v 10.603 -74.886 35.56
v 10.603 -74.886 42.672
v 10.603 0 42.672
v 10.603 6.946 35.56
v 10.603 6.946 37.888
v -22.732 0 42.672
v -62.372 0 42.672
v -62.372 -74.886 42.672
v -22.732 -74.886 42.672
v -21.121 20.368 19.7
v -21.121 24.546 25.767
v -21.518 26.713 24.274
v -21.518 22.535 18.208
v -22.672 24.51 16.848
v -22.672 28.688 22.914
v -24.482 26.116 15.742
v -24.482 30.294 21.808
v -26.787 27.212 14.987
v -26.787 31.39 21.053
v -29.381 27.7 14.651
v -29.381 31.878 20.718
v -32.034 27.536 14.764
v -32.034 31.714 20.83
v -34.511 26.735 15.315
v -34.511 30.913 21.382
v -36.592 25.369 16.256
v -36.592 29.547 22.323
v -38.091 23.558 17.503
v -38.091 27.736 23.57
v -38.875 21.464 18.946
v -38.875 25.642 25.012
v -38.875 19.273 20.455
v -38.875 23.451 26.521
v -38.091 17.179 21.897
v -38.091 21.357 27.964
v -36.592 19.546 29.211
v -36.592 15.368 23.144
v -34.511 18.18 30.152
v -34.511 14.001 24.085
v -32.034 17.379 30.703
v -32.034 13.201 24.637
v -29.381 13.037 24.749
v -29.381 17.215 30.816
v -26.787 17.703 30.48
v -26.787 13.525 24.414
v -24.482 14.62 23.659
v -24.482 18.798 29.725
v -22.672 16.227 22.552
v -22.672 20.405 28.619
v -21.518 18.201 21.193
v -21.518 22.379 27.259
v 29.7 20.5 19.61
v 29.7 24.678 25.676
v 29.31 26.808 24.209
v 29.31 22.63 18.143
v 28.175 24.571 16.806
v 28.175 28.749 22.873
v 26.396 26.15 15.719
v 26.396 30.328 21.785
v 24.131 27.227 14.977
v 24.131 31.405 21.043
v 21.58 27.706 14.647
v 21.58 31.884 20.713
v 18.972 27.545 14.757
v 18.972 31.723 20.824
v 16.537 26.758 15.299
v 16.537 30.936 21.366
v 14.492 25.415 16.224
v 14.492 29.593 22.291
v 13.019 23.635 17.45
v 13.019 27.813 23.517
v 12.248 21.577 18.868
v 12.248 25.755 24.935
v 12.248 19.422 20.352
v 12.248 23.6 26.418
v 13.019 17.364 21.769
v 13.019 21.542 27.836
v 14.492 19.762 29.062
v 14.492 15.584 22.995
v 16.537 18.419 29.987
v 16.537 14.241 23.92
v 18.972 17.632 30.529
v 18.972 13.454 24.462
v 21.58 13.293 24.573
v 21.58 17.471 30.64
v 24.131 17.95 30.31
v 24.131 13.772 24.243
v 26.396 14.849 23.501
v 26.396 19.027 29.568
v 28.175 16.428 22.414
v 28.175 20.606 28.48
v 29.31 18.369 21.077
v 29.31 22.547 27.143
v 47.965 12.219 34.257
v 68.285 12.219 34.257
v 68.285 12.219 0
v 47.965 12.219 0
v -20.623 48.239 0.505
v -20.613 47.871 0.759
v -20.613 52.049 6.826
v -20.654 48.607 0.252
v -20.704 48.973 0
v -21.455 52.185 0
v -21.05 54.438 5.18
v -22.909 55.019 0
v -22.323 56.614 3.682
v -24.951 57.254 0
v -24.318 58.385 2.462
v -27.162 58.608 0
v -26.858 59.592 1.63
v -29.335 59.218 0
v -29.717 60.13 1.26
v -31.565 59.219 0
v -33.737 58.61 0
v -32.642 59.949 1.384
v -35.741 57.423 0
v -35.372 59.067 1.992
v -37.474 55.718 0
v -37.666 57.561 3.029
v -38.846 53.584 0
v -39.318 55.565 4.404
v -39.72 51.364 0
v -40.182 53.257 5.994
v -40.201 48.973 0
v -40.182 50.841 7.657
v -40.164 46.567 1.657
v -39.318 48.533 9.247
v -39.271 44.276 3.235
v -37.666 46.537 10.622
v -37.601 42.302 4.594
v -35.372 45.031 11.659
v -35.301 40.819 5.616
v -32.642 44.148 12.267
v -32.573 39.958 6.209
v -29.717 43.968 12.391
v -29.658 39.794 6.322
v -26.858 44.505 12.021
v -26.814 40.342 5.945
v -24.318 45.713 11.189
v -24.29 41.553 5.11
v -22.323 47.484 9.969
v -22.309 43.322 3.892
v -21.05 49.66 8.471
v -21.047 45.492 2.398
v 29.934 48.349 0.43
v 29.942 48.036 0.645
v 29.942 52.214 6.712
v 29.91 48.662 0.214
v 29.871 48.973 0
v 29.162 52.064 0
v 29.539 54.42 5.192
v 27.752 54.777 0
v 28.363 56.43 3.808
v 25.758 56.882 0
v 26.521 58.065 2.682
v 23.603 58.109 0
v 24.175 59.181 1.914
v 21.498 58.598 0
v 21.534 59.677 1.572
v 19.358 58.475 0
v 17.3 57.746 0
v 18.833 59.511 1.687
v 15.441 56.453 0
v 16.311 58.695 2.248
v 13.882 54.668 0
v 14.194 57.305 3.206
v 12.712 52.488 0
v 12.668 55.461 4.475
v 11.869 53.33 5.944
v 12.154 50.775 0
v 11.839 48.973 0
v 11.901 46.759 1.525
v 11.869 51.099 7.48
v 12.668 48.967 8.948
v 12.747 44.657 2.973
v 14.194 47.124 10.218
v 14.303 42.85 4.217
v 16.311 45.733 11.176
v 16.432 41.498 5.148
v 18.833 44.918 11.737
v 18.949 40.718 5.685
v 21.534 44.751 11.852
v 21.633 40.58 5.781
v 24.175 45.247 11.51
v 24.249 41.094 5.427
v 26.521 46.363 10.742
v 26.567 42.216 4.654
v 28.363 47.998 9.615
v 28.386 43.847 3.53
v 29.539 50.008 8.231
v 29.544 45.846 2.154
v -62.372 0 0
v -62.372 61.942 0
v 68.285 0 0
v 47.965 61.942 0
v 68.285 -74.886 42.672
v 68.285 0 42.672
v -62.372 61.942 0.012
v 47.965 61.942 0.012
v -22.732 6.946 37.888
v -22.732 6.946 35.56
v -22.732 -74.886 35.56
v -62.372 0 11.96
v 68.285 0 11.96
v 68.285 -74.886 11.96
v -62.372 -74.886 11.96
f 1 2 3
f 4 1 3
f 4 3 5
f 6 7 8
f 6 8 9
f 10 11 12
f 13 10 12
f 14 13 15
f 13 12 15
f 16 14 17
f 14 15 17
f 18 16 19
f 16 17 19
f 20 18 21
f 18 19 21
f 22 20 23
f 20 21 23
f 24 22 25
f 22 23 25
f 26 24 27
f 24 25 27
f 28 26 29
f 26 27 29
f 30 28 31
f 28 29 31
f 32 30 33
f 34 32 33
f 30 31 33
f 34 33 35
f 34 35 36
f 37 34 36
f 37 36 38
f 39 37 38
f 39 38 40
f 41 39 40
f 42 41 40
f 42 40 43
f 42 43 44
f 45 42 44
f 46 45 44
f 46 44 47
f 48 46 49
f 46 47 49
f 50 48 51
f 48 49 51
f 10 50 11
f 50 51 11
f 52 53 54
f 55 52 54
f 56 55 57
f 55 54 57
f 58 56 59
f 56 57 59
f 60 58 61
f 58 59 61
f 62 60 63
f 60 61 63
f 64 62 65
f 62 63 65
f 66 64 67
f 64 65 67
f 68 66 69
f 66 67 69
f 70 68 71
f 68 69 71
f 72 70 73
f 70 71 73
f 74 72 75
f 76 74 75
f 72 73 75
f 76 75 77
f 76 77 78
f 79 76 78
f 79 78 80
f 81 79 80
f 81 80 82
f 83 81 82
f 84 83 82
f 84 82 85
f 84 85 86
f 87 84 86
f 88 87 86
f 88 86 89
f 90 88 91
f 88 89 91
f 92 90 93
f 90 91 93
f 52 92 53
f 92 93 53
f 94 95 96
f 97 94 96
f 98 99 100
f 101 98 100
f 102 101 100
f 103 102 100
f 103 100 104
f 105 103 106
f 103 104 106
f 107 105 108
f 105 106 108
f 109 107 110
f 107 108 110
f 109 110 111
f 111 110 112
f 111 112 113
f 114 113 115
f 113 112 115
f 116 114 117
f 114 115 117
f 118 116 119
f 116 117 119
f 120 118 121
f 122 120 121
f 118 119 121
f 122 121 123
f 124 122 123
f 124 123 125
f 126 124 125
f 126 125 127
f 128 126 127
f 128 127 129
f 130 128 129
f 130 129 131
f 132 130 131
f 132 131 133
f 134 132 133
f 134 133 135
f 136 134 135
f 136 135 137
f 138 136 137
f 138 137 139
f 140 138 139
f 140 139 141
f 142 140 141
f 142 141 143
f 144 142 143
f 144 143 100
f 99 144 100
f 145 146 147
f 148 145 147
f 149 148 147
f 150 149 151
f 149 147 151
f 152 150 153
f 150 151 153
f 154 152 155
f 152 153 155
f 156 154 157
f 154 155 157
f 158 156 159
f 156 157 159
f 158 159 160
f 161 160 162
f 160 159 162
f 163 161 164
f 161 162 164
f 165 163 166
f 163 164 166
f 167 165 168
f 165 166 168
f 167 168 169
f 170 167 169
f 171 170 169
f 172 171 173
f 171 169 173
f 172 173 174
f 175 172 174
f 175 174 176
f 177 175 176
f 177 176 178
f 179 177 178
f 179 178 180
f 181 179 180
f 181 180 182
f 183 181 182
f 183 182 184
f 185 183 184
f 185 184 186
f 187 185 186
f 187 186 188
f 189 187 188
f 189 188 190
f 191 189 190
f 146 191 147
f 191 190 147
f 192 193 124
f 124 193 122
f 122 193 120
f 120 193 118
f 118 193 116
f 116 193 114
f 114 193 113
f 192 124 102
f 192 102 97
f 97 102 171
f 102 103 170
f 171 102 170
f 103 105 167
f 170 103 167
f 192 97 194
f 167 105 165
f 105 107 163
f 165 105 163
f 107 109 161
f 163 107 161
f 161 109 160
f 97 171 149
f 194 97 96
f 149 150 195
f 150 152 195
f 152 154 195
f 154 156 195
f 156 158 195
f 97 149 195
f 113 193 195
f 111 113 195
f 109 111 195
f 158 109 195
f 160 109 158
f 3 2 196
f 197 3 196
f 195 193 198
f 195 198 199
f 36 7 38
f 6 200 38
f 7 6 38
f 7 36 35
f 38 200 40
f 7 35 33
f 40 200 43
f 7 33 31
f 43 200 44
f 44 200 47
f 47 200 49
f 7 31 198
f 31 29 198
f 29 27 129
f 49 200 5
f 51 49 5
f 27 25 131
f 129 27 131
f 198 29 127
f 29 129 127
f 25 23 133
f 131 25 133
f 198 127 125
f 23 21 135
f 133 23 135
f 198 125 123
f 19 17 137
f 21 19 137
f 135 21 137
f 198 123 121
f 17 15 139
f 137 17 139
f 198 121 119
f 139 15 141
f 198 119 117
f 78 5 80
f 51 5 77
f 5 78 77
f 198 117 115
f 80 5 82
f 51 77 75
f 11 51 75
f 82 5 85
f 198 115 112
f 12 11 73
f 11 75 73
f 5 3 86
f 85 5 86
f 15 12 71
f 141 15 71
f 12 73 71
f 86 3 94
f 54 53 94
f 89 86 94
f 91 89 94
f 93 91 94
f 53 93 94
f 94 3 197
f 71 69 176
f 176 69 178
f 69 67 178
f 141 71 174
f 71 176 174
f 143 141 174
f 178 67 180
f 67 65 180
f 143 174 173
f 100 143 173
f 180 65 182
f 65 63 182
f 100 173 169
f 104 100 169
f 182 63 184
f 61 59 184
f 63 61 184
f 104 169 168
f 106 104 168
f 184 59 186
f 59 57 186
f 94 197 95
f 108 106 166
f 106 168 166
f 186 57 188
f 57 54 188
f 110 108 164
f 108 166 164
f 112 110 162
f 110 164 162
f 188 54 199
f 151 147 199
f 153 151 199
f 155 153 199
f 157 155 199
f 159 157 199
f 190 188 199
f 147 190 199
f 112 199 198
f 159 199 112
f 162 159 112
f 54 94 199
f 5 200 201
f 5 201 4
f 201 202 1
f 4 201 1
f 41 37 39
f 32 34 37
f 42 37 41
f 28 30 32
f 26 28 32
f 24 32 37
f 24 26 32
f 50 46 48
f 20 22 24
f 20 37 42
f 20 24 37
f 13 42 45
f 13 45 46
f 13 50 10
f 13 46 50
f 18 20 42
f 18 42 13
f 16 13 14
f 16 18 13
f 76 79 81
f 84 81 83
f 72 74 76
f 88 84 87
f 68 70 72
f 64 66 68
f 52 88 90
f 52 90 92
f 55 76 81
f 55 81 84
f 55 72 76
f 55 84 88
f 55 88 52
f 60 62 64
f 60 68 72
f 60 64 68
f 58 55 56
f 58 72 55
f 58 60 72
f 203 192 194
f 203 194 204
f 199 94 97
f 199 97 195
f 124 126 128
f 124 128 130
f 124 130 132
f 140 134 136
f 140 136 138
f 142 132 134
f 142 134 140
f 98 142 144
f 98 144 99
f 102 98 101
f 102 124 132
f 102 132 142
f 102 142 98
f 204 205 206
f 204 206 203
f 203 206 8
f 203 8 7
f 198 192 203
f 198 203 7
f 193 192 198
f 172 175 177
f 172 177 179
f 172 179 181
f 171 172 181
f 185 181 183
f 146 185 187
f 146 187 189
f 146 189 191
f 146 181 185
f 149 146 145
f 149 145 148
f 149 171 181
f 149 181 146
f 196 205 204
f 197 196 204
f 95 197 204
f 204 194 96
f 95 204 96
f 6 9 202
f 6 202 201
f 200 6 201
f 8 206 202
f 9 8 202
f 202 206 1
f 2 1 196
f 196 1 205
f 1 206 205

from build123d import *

# Parameters (mm, degrees)
F0_W      = 130.6576728821
F0_H      = 136.8280164897
F1_DEPTH  = 42.672
F3_DEPTH  = 168.402
F4_W      = 33.3350868896
F4_H      = 81.8327208981
F5_DEPTH  = 7.112
F7_DEPTH  = 20.32
F8_W      = 74.8863741755
F8_H      = 14.6345880348
F9_DEPTH  = 153.162
F10_R     = 8.7751073359
F10_R_2   = 8.9268024196
F10_R_3   = 9.0872621363
F10_R_4   = 9.8396569886
F11_DEPTH = 7.366


with BuildPart() as f1:
    # F0 (on Top) → F1 (new body)
    with BuildSketch(Plane.XY):
        with Locations((2.9565617442, -6.4723659307)):
            Rectangle(F0_W, F0_H)
    extrude(amount=F1_DEPTH)

    # F2 (on face) → F3 (cut)
    with BuildSketch(Plane.YZ.offset(68.2853981853)):
        Polygon((81.023953855, 51.4655448496), (0, 42.672), (83.4134221077, -14.7754913196), align=None)
    extrude(amount=-F3_DEPTH, mode=Mode.SUBTRACT)

    # F4 (on face) → F5 (cut)
    with BuildSketch(Plane.XY.offset(42.672)):
        with Locations((-6.0645765625, -33.9700137265)):
            Rectangle(F4_W, F4_H)
    extrude(amount=-F5_DEPTH, mode=Mode.SUBTRACT)

    # F6 (on face) → F7 (cut)
    with BuildSketch(Plane.YZ.offset(68.2853981853)):
        Polygon((71.3876187801, 35.8445122838), (12.2187227448, 34.2568678656), (12.2187227448, -9.6190823242), (71.3876187801, -9.6190823242), align=None)
    extrude(amount=-F7_DEPTH, mode=Mode.SUBTRACT)

    # F8 (on face) → F9 (cut)
    with BuildSketch(Plane.YZ.offset(68.2853981853)):
        with Locations((-37.4431870878, 4.6425884357)):
            Rectangle(F8_W, F8_H)
    extrude(amount=-F9_DEPTH, mode=Mode.SUBTRACT)

    # F10 (on face) → F11 (cut)
    with BuildSketch(Plane(origin=(0, 19.933646388, 28.943538214), x_dir=(1, 0, 0), z_dir=(0, 0.5672042031, 0.8235771925))):
        with Locations((20.9246538579, 5.7601314038)):
            Circle(F10_R)
        with Locations((-30.0480592996, 5.6009339169)):
            Circle(F10_R_2)
        with Locations((20.8549834788, 39.1954258084)):
            Circle(F10_R_3)
        with Locations((-30.4525401443, 38.9948263764)):
            Circle(F10_R_4)
    extrude(amount=-F11_DEPTH, mode=Mode.SUBTRACT)


solid = f1.part
